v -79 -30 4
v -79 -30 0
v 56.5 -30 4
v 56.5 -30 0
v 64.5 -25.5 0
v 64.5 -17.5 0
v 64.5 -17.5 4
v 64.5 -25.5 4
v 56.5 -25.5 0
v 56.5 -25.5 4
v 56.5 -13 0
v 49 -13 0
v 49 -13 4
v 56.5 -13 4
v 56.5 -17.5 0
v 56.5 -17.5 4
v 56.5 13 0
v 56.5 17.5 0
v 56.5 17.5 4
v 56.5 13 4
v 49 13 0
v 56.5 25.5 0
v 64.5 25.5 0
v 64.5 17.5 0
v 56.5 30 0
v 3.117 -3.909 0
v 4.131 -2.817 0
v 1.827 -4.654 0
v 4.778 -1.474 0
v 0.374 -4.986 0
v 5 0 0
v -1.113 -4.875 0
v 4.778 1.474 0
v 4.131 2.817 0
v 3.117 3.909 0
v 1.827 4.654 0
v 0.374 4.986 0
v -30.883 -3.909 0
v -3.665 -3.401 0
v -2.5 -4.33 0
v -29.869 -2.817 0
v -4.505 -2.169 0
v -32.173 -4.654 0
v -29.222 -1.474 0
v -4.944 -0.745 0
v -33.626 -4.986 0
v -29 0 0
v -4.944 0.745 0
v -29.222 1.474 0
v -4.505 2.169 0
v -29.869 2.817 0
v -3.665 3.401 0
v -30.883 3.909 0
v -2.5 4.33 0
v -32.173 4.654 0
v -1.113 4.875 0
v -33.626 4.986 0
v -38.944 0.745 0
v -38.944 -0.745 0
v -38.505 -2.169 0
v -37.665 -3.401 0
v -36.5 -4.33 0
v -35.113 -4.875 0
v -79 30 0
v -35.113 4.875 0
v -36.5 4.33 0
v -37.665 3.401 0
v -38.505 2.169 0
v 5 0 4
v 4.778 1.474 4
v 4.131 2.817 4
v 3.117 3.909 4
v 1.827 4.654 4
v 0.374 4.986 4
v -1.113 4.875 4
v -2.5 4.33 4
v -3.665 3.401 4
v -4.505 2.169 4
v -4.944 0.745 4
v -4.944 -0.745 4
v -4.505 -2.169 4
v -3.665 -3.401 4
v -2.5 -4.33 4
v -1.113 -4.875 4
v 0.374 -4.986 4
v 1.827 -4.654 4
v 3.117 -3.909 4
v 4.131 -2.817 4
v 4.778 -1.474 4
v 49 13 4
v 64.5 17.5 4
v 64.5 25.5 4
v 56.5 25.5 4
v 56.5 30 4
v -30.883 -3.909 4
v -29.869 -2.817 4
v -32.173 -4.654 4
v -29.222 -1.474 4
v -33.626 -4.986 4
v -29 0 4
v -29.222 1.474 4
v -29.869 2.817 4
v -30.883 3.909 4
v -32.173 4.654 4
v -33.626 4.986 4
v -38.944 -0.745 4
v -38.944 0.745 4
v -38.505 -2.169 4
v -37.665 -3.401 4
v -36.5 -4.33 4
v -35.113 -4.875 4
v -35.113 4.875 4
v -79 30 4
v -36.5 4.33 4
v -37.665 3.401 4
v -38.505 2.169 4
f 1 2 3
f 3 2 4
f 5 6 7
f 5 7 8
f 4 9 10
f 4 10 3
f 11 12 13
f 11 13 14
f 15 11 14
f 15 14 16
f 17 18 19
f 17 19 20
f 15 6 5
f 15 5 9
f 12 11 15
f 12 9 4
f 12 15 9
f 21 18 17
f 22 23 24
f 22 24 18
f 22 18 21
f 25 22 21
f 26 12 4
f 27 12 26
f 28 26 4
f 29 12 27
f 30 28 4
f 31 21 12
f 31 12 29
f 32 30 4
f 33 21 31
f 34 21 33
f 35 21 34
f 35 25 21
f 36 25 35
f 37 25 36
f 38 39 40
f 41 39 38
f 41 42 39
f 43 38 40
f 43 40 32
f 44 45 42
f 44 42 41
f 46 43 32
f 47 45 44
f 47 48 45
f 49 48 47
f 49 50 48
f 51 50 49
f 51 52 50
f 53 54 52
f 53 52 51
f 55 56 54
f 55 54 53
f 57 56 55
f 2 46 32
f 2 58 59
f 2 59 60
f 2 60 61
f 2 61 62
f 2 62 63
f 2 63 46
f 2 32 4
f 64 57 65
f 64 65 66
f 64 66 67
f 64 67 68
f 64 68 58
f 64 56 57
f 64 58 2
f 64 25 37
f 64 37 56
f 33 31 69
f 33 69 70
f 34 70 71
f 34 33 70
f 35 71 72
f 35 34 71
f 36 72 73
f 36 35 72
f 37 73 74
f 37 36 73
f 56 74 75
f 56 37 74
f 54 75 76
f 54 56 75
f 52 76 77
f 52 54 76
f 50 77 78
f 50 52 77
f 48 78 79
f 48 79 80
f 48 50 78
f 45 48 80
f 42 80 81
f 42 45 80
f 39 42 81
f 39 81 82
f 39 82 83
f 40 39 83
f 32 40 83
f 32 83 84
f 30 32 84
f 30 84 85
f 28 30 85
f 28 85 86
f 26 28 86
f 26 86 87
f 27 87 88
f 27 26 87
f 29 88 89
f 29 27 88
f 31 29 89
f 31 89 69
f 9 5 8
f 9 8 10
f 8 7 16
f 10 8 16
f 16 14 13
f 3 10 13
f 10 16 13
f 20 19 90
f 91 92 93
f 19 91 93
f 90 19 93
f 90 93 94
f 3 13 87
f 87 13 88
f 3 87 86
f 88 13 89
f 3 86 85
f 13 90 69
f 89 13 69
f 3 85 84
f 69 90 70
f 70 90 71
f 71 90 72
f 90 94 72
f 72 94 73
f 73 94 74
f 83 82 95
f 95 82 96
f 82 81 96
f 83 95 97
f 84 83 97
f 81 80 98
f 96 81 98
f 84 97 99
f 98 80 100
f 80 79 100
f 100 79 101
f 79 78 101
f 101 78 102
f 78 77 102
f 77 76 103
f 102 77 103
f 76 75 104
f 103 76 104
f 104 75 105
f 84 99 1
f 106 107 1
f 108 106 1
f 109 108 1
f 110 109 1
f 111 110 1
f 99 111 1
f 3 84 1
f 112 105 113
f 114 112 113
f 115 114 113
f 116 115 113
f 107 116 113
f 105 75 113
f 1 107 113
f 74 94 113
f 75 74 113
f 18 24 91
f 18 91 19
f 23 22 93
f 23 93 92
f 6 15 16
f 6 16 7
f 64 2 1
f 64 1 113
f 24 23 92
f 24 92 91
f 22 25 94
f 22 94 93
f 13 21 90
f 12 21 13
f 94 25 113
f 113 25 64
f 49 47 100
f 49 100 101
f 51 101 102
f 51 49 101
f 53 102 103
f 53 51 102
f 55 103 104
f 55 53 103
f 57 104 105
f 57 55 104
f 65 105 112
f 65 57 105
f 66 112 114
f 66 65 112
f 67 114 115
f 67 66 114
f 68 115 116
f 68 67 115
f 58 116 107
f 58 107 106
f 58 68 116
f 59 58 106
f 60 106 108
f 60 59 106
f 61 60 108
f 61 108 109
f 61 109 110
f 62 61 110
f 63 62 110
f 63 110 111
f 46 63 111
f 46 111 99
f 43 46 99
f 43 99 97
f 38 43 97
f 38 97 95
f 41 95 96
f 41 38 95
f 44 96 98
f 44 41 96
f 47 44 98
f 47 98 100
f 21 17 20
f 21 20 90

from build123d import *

# Parameters (mm, degrees)
SKETCH1_R           = 5
BOSS_EXTRUDE1_DEPTH = 4


with BuildPart() as part:
    # Sketch1 → Boss-Extrude1 (new body)
    with BuildSketch(Plane.XY):
        Polygon((49, 30), (56.5, 30), (56.5, 25.5), (64.5, 25.5), (64.5, 17.5), (56.5, 17.5), (56.5, 13), (49, 13), (49, -13), (56.5, -13), (56.5, -17.5), (64.5, -17.5), (64.5, -25.5), (56.5, -25.5), (56.5, -30), (49, -30), (-79, -30), (-79, 30), align=None)
        Circle(SKETCH1_R, mode=Mode.SUBTRACT)
        with Locations((-34, 0)):
            Circle(SKETCH1_R, mode=Mode.SUBTRACT)
    extrude(amount=BOSS_EXTRUDE1_DEPTH)


solid = part.part
